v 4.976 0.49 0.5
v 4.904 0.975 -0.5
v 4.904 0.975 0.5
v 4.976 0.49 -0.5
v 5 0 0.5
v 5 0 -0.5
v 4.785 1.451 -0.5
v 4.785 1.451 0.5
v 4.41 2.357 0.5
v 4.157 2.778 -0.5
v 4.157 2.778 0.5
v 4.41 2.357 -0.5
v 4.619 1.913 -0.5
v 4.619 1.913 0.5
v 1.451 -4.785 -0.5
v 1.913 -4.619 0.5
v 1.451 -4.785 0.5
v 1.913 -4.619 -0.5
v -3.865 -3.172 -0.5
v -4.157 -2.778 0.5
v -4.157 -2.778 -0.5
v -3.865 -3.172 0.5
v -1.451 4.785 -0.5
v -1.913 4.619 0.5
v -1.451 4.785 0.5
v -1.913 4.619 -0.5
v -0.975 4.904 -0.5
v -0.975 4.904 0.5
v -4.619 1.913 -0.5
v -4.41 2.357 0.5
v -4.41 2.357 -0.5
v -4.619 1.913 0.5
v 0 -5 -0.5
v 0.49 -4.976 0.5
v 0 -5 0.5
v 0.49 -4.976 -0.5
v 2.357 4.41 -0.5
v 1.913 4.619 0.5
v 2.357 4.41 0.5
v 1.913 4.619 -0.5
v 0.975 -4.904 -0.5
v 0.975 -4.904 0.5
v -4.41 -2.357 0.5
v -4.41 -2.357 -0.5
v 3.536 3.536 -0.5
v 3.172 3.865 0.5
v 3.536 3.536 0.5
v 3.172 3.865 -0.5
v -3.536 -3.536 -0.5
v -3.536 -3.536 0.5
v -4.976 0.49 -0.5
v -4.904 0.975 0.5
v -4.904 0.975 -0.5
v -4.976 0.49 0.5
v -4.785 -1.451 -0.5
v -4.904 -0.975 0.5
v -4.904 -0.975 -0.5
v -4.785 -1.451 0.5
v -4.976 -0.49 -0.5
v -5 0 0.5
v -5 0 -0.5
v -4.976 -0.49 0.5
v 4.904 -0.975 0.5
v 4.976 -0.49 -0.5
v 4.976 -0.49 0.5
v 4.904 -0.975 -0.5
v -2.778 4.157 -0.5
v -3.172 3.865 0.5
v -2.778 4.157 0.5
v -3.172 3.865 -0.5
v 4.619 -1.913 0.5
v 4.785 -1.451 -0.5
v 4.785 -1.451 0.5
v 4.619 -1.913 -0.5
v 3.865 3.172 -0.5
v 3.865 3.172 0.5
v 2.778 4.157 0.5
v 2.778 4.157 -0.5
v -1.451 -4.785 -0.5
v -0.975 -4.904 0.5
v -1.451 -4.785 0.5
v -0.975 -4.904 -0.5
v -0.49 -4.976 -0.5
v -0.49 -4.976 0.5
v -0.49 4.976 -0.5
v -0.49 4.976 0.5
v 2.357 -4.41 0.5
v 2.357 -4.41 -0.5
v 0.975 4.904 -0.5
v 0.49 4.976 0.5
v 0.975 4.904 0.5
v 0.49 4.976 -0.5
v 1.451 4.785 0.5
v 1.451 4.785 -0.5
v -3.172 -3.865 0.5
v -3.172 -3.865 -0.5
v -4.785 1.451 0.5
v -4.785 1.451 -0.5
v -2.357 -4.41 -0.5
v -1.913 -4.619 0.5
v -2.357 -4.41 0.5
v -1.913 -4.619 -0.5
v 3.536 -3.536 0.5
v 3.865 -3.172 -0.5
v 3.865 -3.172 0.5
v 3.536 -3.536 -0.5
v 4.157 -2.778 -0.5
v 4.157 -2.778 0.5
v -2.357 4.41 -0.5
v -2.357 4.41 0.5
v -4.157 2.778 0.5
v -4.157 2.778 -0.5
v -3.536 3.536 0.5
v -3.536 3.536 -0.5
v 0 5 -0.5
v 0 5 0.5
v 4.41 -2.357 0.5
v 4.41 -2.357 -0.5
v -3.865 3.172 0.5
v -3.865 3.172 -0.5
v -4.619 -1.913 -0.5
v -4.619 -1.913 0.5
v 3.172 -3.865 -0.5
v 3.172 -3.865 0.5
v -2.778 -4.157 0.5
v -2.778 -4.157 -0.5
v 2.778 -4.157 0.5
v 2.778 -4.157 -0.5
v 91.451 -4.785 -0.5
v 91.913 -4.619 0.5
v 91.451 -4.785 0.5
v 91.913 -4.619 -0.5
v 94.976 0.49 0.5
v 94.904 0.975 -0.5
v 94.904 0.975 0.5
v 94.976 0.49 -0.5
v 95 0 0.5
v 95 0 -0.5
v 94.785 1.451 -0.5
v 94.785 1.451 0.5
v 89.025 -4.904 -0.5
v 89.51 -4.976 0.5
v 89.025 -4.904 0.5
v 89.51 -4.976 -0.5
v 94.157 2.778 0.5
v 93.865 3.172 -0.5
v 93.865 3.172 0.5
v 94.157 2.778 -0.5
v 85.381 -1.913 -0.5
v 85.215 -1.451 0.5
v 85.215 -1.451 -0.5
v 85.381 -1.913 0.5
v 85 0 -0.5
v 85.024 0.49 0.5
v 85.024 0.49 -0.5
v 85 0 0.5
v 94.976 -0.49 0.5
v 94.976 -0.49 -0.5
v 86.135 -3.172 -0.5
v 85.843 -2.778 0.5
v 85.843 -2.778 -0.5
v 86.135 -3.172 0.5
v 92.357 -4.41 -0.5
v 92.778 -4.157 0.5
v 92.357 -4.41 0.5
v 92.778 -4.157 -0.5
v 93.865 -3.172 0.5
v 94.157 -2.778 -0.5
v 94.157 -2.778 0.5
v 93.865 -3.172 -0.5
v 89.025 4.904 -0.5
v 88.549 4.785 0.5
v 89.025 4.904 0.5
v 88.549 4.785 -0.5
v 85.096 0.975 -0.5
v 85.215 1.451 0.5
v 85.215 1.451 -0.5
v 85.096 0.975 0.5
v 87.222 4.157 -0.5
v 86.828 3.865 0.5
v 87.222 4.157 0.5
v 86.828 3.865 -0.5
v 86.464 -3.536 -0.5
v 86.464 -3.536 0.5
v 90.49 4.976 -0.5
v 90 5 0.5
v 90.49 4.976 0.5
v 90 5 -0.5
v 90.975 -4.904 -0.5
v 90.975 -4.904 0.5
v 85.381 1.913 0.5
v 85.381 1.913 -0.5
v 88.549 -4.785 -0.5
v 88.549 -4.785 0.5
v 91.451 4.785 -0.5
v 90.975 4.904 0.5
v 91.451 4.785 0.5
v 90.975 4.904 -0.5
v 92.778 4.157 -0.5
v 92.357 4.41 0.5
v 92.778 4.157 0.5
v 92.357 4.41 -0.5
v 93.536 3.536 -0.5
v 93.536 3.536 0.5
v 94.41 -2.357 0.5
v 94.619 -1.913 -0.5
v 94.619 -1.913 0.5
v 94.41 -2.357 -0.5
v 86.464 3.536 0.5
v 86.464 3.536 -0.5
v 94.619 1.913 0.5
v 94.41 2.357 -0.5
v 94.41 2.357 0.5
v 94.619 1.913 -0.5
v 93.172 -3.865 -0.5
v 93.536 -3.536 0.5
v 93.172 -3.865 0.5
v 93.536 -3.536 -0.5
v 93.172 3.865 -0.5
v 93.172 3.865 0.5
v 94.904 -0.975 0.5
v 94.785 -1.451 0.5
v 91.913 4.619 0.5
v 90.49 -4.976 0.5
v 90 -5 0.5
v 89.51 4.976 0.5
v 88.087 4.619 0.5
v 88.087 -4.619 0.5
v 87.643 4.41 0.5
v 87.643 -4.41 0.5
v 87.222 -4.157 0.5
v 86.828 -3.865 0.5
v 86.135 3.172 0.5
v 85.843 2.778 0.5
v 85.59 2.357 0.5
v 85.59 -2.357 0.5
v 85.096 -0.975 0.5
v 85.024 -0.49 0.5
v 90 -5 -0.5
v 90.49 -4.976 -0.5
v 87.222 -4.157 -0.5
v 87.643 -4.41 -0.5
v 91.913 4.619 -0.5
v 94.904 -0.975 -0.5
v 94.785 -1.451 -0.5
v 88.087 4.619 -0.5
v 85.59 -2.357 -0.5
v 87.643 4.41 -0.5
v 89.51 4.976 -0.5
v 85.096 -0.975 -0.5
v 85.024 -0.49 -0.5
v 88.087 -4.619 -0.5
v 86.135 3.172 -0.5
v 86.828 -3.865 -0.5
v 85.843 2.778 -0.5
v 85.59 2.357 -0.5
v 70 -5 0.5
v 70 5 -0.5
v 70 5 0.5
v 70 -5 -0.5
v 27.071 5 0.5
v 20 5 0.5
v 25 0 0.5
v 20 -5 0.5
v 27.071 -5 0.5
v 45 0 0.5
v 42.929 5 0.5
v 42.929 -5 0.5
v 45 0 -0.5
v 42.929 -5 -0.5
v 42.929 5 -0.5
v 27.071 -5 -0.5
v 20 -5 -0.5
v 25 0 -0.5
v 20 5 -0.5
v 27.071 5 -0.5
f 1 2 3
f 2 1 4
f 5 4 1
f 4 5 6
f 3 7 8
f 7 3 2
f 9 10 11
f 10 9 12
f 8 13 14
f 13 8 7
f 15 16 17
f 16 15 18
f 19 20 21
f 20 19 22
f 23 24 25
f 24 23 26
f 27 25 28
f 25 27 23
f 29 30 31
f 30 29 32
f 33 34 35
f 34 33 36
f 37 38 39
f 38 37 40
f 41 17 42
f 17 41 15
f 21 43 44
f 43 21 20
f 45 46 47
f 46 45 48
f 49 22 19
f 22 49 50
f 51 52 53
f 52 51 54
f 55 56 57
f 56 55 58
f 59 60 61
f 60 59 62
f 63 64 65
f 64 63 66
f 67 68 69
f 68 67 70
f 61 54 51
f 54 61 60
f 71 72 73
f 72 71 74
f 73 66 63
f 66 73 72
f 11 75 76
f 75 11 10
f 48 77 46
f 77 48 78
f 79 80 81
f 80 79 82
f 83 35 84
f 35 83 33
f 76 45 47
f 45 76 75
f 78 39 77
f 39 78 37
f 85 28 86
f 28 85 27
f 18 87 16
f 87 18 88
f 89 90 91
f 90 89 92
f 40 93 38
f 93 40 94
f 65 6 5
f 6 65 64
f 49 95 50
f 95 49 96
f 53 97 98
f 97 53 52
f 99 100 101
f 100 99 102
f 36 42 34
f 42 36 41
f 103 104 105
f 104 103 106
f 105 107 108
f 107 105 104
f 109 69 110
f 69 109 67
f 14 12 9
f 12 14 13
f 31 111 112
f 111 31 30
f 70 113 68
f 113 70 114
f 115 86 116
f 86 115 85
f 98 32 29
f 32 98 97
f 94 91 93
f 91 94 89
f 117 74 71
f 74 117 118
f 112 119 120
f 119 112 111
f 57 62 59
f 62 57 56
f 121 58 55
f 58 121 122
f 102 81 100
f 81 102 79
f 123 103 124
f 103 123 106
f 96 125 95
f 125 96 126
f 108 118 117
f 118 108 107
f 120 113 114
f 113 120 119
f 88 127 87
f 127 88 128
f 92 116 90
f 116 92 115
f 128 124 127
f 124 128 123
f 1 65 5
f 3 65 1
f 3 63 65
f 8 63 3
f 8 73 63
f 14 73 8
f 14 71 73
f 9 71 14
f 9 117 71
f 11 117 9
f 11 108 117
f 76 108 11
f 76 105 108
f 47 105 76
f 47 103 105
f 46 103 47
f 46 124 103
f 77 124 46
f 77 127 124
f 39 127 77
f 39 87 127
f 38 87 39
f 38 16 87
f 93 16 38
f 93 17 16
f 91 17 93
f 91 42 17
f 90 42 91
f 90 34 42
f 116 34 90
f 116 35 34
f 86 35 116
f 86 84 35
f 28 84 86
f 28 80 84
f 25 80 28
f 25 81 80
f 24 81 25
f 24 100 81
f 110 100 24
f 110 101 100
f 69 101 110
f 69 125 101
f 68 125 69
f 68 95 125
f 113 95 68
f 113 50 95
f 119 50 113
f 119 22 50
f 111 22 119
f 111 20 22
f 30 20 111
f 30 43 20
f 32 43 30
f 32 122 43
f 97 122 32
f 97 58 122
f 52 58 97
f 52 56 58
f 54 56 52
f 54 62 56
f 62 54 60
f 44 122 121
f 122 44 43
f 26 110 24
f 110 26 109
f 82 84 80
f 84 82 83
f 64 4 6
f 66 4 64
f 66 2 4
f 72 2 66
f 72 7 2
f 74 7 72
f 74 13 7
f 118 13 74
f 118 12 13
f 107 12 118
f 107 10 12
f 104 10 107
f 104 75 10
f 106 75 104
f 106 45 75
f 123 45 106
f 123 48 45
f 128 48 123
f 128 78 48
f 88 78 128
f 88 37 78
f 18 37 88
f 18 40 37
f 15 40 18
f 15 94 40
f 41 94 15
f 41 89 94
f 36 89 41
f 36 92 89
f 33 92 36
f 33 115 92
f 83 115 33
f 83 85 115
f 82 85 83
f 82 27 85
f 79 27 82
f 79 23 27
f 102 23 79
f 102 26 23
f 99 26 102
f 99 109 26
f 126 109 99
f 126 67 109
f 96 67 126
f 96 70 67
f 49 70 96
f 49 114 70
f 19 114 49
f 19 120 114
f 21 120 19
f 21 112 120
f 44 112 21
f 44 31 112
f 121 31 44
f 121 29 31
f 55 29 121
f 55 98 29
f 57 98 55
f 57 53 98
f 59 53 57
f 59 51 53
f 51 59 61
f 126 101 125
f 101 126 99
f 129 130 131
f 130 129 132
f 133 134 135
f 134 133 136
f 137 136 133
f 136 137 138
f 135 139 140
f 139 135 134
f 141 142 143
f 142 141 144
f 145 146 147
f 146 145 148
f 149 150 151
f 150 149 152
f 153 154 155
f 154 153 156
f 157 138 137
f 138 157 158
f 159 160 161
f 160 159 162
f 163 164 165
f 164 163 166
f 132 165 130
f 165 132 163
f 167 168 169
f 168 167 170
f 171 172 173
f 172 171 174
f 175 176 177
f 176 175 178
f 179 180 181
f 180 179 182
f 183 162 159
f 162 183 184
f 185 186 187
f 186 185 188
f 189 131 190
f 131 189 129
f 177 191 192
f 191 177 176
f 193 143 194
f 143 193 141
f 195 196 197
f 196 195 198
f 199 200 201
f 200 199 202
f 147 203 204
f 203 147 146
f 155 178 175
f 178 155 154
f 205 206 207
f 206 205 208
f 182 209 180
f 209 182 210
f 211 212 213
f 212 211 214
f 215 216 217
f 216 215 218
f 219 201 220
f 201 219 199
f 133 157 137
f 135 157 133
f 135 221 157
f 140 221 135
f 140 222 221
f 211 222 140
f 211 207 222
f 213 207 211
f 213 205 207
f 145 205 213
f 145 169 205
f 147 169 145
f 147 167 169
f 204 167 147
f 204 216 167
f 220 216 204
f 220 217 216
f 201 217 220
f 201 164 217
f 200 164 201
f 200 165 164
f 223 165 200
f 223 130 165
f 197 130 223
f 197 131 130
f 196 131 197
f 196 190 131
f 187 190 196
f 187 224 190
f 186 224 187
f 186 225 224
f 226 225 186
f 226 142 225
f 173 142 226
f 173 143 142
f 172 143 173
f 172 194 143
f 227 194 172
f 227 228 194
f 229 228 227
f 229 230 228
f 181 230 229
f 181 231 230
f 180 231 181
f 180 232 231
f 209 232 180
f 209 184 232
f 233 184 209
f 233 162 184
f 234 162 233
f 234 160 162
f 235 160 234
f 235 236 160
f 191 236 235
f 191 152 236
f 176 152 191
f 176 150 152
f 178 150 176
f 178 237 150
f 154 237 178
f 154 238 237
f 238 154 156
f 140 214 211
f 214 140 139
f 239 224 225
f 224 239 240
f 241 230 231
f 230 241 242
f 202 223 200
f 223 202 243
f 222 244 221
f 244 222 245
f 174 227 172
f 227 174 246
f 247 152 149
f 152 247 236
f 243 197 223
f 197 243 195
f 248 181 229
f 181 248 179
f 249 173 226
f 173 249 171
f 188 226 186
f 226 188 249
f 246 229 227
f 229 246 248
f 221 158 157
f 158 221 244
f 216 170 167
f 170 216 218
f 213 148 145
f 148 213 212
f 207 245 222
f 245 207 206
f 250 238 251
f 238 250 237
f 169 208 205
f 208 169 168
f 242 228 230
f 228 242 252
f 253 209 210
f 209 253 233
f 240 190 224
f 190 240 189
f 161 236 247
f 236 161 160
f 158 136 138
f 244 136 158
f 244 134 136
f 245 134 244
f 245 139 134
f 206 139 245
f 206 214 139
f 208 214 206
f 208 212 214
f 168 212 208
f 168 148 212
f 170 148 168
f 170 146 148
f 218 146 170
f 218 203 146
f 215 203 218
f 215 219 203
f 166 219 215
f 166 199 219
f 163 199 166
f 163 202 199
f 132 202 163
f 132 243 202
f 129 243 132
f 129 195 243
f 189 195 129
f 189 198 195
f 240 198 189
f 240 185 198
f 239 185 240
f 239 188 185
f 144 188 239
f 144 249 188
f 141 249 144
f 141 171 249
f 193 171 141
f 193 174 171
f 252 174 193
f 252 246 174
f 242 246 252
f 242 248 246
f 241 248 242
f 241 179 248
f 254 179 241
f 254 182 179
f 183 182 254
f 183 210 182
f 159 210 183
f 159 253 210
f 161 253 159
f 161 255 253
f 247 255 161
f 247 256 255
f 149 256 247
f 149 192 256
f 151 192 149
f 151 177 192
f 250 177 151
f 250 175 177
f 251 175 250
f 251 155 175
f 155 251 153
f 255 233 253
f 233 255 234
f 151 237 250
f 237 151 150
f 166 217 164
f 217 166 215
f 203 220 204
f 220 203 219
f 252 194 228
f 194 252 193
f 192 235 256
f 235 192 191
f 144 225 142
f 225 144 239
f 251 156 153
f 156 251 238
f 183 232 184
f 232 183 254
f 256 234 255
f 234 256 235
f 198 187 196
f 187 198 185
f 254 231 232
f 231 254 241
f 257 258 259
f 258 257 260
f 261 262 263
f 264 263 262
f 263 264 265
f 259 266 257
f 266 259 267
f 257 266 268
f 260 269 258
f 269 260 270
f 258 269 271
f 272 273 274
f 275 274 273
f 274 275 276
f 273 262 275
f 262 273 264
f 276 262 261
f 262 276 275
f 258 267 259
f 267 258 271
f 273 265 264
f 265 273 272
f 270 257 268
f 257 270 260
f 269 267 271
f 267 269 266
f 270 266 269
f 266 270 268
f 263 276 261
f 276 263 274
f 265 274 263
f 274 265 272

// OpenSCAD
module rounded_plate() {
    difference() {
        union() {
            translate([0, 0, -0.5])
                cylinder(h=1, r=5, $fn=64);
            translate([90, 0, -0.5])
                cylinder(h=1, r=5, $fn=64);
            translate([45, 0, 0])
                cube([50, 10, 1], center=true);
        }
        translate([35, 0, -1])
            cylinder(h=2, r=10, $fn=8);
        for (i = [-30, -10, 10, 30]) {
            translate([i, 0, -1])
                t_slot();
        }
    }
}

module t_slot() {
    difference() {
        translate([-2.5, -1, -1])
            cube([5, 2, 2], center=true);
        translate([-1, -3, -1])
            cube([2, 6, 2], center=true);
    }
}

rounded_plate();
